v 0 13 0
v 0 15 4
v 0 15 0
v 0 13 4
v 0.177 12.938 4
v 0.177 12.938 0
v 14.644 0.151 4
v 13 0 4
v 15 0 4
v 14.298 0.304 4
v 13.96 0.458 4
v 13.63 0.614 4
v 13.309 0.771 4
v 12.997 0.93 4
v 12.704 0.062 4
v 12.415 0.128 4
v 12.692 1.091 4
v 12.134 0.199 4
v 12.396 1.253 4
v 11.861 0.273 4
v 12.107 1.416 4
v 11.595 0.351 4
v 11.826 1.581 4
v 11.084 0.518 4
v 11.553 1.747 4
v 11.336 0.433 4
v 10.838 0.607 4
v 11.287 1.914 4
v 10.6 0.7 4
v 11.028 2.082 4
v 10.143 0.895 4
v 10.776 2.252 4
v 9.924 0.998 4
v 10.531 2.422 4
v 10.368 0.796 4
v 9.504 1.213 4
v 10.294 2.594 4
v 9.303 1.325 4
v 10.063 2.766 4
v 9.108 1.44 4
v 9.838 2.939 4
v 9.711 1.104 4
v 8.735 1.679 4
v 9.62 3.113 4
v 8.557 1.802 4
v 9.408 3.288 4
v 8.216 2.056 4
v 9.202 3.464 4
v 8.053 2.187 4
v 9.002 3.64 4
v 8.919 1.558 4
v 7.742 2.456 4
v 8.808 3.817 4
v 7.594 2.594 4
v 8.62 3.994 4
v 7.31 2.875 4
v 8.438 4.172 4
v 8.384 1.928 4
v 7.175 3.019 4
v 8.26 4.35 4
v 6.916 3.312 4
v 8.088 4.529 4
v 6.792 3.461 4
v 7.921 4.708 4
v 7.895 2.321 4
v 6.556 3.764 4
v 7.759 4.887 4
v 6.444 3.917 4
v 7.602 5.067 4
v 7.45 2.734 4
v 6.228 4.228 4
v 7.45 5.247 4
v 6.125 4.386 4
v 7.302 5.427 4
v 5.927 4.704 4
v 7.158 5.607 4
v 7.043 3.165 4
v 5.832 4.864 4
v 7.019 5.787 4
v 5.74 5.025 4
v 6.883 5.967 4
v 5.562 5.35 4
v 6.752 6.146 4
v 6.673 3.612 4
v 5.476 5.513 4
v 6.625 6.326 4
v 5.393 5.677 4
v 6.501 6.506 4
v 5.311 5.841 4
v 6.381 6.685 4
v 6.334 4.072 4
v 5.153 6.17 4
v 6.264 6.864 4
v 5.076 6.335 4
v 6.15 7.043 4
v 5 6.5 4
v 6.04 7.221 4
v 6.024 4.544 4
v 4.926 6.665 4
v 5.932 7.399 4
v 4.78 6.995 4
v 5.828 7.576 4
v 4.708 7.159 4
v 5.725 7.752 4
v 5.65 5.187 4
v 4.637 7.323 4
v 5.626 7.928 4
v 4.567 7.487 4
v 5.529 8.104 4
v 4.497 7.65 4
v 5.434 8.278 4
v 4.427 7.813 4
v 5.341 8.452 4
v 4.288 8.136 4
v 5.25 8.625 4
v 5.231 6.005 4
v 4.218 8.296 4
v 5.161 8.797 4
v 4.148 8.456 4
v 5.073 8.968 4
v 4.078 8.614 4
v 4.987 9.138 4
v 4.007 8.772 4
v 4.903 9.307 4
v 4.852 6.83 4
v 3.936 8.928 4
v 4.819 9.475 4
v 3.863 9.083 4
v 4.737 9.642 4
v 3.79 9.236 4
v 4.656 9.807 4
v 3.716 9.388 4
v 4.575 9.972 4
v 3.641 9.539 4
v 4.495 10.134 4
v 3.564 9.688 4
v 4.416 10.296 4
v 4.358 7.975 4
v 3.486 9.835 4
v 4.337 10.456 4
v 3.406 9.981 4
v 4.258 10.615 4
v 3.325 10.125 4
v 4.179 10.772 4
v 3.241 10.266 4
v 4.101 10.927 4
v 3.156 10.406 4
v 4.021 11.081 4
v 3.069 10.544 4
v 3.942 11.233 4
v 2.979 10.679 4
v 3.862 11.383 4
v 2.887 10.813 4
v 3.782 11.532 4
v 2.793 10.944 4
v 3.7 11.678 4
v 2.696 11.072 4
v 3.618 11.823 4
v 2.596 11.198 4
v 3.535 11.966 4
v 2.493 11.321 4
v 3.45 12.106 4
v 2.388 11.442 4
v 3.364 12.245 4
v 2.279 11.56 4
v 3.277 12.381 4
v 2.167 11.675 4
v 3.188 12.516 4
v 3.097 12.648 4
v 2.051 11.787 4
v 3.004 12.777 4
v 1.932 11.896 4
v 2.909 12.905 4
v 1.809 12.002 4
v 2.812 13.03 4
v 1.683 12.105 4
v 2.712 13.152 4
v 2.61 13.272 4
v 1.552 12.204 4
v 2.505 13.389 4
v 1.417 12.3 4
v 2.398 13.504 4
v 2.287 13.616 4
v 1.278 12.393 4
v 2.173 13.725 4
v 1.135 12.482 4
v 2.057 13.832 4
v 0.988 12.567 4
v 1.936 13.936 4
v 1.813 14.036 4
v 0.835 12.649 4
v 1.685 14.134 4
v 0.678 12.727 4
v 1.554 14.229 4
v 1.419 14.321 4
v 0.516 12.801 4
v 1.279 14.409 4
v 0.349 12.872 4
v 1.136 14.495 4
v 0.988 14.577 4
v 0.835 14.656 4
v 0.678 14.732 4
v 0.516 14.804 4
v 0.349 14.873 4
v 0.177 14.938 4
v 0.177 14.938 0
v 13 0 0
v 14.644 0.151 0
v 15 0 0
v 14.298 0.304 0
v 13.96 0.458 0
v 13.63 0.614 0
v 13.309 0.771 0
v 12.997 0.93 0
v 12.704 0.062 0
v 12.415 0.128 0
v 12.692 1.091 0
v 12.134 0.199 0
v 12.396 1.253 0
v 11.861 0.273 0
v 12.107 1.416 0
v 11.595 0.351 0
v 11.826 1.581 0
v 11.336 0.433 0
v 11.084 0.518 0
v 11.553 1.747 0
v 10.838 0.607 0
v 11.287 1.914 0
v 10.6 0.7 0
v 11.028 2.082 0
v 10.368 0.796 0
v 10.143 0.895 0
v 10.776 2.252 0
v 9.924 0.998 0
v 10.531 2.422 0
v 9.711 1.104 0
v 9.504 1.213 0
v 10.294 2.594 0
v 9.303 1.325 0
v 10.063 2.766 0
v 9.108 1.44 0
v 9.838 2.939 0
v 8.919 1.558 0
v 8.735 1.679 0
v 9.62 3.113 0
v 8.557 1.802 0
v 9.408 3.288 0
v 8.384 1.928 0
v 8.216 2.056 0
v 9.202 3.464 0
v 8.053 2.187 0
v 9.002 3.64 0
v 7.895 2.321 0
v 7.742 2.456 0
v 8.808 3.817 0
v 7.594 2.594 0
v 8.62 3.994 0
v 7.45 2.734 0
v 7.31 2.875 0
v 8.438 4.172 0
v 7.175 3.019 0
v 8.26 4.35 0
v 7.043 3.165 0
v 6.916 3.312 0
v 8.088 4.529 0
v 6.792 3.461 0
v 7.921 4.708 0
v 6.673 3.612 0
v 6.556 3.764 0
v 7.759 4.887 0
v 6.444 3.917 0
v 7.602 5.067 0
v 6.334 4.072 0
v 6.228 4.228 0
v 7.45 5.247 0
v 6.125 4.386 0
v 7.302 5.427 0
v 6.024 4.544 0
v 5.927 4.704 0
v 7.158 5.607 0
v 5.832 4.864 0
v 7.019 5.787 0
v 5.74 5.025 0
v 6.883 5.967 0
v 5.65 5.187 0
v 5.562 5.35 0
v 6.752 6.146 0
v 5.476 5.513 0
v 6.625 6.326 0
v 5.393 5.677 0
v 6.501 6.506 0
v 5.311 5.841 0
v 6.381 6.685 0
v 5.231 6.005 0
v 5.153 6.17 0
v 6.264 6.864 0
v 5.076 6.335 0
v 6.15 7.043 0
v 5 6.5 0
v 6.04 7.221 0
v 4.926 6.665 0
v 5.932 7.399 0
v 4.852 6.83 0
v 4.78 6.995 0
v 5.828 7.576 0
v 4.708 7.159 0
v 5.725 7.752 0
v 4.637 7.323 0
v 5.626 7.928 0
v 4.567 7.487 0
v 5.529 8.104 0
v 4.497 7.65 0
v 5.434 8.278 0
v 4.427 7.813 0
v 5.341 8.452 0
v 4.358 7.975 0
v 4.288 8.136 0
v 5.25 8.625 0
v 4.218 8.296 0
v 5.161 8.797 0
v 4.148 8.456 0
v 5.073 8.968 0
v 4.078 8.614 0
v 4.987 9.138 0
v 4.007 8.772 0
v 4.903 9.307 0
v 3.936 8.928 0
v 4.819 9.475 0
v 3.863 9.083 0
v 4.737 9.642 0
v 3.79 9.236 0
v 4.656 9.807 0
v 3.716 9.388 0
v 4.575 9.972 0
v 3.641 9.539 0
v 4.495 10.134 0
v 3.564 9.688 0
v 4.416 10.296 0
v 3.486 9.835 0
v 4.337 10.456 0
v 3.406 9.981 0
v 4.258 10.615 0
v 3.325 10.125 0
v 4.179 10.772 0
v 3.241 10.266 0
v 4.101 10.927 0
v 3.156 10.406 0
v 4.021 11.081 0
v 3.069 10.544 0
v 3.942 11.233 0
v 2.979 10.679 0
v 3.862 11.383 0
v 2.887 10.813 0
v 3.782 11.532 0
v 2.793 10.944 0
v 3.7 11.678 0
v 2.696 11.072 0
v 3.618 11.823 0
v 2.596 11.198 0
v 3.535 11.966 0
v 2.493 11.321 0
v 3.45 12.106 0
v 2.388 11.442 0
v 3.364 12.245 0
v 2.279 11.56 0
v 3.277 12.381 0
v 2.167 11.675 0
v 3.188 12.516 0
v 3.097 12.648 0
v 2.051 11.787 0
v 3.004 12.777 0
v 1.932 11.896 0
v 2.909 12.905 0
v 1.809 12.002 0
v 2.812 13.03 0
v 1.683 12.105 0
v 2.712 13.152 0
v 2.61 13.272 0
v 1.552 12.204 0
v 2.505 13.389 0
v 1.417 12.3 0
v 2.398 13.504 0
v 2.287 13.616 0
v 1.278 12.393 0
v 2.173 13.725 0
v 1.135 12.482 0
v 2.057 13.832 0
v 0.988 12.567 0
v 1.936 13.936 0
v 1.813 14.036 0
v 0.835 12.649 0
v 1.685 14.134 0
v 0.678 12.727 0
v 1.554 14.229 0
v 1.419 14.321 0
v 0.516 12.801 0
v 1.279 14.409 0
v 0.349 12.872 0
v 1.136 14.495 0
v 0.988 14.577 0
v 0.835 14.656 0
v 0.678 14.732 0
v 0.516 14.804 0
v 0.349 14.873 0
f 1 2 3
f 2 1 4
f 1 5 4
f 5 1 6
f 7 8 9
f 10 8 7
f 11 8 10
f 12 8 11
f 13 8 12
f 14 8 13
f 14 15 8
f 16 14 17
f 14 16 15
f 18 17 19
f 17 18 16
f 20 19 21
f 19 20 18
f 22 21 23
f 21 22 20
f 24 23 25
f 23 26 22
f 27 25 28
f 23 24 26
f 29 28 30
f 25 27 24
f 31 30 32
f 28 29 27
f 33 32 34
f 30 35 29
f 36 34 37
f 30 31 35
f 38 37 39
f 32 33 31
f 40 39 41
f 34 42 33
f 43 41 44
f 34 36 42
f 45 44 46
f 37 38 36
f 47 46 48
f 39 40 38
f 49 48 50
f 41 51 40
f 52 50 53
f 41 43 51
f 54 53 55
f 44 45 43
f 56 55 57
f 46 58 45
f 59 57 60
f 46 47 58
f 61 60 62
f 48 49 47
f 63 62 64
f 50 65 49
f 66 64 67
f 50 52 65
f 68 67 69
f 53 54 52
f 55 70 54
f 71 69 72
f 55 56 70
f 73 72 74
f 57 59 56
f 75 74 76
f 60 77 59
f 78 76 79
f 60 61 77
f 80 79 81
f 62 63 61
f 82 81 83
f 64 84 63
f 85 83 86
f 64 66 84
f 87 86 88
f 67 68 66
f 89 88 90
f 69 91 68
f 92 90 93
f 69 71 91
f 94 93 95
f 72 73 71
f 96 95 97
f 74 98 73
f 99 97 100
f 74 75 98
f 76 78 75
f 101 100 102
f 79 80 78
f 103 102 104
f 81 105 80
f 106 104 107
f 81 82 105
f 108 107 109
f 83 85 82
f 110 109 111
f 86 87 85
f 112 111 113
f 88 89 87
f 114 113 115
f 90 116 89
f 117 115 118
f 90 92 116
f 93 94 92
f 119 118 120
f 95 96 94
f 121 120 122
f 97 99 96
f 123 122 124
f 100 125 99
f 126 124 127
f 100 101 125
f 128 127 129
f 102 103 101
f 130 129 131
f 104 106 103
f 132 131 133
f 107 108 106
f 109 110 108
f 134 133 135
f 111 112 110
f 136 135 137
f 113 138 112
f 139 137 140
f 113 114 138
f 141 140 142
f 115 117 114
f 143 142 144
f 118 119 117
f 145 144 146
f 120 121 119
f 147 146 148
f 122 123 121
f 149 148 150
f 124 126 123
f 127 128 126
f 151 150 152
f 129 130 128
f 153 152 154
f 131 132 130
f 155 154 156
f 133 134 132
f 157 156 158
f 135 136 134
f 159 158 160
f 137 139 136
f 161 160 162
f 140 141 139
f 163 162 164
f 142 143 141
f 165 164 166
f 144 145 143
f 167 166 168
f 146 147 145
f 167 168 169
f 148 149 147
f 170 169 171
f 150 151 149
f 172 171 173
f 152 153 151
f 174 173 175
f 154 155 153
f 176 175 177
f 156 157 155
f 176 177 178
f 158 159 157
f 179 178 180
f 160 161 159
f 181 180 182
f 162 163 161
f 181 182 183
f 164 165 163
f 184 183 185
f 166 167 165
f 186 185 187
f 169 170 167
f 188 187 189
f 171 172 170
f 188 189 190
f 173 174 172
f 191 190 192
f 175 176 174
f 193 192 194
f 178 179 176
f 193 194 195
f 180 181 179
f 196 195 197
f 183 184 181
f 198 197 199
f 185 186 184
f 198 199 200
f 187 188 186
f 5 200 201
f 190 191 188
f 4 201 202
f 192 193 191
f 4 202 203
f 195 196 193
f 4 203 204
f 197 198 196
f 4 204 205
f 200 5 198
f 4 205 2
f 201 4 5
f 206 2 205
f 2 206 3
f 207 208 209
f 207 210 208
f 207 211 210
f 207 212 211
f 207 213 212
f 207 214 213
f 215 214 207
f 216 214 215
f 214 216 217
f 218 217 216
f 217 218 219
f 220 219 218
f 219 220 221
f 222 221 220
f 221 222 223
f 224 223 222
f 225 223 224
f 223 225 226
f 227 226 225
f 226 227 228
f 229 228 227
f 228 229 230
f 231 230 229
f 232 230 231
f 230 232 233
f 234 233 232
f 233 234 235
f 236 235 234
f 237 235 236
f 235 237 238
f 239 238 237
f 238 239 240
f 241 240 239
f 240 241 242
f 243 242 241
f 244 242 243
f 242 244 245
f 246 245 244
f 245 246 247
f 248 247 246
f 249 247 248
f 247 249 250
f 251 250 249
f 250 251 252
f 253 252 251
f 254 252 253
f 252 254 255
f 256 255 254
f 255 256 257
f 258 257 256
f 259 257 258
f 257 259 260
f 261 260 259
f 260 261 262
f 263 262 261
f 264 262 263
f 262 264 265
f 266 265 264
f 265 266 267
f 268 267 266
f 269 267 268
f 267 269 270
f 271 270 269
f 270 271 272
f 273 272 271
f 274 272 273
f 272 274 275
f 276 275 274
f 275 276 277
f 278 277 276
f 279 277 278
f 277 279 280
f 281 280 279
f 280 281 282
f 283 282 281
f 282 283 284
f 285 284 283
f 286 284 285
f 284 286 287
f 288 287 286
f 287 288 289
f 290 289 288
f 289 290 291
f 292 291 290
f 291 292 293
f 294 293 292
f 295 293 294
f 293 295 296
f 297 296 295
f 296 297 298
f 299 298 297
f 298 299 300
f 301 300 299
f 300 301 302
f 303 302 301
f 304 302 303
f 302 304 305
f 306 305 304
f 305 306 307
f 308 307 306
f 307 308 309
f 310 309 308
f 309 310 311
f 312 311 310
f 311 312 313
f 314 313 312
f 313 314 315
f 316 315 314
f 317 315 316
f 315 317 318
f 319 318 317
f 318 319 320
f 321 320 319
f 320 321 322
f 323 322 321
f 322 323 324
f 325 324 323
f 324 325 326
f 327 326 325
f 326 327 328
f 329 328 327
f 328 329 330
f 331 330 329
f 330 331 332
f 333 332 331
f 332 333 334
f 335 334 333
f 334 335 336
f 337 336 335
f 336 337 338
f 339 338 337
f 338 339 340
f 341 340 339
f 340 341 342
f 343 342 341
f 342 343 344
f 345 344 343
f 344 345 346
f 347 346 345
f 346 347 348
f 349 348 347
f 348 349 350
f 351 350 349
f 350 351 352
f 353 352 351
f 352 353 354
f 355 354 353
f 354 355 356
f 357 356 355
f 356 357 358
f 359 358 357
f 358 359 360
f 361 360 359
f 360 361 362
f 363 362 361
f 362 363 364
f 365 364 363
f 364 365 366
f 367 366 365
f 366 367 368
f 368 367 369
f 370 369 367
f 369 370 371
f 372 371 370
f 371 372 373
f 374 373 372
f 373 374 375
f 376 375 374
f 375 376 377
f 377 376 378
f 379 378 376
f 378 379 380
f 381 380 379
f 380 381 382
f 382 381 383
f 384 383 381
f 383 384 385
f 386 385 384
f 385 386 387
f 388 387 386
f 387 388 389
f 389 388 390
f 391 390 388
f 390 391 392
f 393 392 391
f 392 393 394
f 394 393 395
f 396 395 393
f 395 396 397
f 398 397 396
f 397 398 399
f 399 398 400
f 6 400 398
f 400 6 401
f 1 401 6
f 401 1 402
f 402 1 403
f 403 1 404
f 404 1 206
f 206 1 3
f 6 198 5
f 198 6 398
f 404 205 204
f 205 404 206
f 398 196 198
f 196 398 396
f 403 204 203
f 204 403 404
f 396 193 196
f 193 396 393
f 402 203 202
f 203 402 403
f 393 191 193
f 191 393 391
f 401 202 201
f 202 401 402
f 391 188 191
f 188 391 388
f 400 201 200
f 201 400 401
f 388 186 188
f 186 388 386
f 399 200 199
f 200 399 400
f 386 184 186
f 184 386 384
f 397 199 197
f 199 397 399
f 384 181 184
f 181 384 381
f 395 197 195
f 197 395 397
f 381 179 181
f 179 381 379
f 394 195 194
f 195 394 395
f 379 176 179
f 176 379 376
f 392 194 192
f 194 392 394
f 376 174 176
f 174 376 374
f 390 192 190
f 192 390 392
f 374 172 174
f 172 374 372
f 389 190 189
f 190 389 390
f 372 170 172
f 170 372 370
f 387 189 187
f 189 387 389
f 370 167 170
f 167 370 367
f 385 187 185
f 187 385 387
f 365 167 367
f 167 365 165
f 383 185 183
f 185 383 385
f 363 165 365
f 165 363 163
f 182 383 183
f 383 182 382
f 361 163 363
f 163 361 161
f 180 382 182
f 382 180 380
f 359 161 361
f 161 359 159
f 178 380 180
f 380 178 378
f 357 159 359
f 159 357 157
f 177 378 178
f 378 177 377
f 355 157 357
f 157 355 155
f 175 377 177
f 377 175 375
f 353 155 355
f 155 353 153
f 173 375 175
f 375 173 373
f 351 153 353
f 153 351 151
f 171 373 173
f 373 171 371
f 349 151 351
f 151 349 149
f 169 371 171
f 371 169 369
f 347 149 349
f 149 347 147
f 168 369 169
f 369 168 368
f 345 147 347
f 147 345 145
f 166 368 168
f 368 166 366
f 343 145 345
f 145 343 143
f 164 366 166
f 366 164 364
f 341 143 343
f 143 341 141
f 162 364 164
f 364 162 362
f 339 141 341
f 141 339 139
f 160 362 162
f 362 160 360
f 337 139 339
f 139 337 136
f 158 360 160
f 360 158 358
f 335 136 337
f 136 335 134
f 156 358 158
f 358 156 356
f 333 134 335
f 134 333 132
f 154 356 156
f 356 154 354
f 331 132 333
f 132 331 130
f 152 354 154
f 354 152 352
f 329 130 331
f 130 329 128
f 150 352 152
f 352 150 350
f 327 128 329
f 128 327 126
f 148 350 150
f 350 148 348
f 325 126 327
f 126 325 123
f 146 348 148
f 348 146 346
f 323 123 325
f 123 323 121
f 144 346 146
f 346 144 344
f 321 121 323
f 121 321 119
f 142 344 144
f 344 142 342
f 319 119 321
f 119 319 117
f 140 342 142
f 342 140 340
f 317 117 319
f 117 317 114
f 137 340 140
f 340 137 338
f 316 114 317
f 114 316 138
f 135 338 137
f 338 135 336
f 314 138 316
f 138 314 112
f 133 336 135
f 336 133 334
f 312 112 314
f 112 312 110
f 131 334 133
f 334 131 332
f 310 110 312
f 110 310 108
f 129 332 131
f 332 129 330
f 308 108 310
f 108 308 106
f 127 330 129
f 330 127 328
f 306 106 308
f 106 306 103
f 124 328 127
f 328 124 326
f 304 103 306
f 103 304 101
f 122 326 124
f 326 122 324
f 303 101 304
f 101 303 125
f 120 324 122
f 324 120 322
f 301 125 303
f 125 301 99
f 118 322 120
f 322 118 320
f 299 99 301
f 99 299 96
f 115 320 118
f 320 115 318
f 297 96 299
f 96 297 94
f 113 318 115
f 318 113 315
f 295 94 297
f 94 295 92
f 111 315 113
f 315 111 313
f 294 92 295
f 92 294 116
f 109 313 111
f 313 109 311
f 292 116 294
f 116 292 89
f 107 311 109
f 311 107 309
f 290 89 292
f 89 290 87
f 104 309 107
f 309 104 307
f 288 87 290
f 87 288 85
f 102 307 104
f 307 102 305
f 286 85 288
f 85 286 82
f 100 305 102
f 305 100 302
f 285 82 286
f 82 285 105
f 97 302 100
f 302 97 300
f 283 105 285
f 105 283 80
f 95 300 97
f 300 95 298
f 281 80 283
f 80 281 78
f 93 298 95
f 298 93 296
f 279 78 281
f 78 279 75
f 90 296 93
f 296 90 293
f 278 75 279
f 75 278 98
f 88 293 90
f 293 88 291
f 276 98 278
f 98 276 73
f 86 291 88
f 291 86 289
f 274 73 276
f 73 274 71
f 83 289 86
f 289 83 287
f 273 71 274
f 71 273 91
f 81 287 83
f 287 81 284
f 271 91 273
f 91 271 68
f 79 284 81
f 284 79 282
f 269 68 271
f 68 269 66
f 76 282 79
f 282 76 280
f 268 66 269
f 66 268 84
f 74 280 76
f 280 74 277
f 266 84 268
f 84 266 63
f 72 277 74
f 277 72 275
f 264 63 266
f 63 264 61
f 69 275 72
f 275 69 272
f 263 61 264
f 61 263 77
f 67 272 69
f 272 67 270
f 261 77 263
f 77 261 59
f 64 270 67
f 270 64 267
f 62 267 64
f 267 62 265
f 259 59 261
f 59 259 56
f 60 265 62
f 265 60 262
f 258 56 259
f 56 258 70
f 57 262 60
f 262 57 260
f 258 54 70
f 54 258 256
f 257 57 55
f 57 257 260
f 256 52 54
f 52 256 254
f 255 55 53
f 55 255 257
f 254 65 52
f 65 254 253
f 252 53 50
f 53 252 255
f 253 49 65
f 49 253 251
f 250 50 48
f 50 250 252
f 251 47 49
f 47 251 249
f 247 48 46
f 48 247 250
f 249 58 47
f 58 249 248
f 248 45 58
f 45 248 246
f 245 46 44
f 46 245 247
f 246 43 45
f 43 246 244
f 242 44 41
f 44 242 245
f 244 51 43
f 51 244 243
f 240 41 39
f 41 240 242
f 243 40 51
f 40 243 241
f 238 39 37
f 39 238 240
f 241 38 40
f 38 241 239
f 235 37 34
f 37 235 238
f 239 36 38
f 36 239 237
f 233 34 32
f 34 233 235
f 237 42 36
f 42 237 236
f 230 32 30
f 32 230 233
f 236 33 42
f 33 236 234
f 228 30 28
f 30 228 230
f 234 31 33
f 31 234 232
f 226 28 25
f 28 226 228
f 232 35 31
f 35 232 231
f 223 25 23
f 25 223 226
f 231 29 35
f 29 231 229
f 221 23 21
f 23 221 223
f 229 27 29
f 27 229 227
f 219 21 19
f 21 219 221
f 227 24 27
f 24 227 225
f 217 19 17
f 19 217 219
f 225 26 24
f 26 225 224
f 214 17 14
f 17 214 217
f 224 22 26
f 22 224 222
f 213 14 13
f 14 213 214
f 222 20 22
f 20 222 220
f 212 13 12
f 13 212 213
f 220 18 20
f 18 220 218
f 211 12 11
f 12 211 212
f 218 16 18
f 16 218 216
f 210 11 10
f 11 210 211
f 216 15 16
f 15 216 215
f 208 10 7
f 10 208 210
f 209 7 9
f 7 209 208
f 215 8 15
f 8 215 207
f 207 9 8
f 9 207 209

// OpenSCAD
//=====================================
// This is public Domain Code
// Contributed by: William A Adams
//=====================================
joinfactor = 0.125;

gSteps = 100;
gHeight = 4;

//======================================
// Demos
//======================================
//BezCubicFilletColored( [[0, 15],[5,5],[10,5],[15,15]], [7.5,12], gSteps, gHeight, 
//	[[1,0,0],[1,1,0],[0,1,1],[0,0,1]]);
//BezCubicFilletColored( [[0, 15],[5,5],[10,5],[15,15]], [7.5,18], gSteps, gHeight, 
//	[[1,0,0],[0,1,0],[0,1,0],[0,0,1]]);
//DrawCubicControlPoints([[0, 15],[5,5],[10,5],[15,15]], [7.5,18], gHeight, $fn=12);

//BezCubicFillet( [[0, 5],[5,15],[10,3],[15,10]], [7.5,0], gSteps, gHeight);
//DrawCubicControlPoints( [[0, 5],[5,15],[10,3],[15,10]], [7.5,0], gHeight, $fn=12);

BezCubicRibbon([[0,15],[6,13],[3,5],[15,0]], [[0,13],[6,11],[3,2],[13,0]]);

//=======================================
// Functions
// These are the 4 blending functions for a cubic bezier curve
//=======================================
// Bernstein Polynomials
function BEZ03(u) = pow((1-u), 3);
function BEZ13(u) = 3*u*(pow((1-u),2));
function BEZ23(u) = 3*(pow(u,2))*(1-u);
function BEZ33(u) = pow(u,3);

// Calculate a singe point along a cubic bezier curve
function PointOnBezCubic2D(p0, p1, p2, p3, u) = [
	BEZ03(u)*p0[0]+BEZ13(u)*p1[0]+BEZ23(u)*p2[0]+BEZ33(u)*p3[0],
	BEZ03(u)*p0[1]+BEZ13(u)*p1[1]+BEZ23(u)*p2[1]+BEZ33(u)*p3[1]];

function PointOnBezCubic3D(p0, p1, p2, p3, u) = [
	BEZ03(u)*p0[0]+BEZ13(u)*p1[0]+BEZ23(u)*p2[0]+BEZ33(u)*p3[0],
	BEZ03(u)*p0[1]+BEZ13(u)*p1[1]+BEZ23(u)*p2[1]+BEZ33(u)*p3[1],
	BEZ03(u)*p0[2]+BEZ13(u)*p1[2]+BEZ23(u)*p2[2]+BEZ33(u)*p3[2]];

//=======================================
// Modules
//=======================================
// This function will extrude a bezier solid from a bezier curve
// It is a straight up prism
// c - ControlPoints
//
module BezCubicFillet(c, focalPoint, steps=gSteps, height=gHeight)
{
	for(step = [steps:1])
	{
		linear_extrude(height = height, convexity = 10) 
		polygon(
			points=[
				focalPoint,
				PointOnBezCubic2D(c[0], c[1], c[2],c[3], step/steps),
				PointOnBezCubic2D(c[0], c[1], c[2],c[3], (step-1)/steps)],
			paths=[[0,1,2,0]]
		);
	}
}

module BezCubicFilletColored(c, focalPoint, steps=gSteps, height=gHeight, colors)
{
	for(step = [steps:1])
	{
		color(PointOnBezCubic3D(colors[0], colors[1], colors[2], colors[3], step/steps))
		linear_extrude(height = height, convexity = 10) 
		polygon(
			points=[
				focalPoint,
				PointOnBezCubic2D(c[0], c[1], c[2],c[3], step/steps),
				PointOnBezCubic2D(c[0], c[1], c[2],c[3], (step-1)/steps)],
			paths=[[0,1,2,0]]
		);
	}
}


module BezCubicRibbon(c1, c2, steps=gSteps, height=gHeight, colors=[[1,0,0],[1,1,0],[0,1,1],[0,0,1]])
{
	for (step=[0:steps-1])
	{
		color(PointOnBezCubic3D(colors[0], colors[1], colors[2], colors[3], step/steps))
		linear_extrude(height = height, convexity = 10) 
		polygon(
			points=[
				PointOnBezCubic2D(c1[0], c1[1], c1[2],c1[3], step/steps),
				PointOnBezCubic2D(c2[0], c2[1], c2[2],c2[3], (step)/steps),
				PointOnBezCubic2D(c2[0], c2[1], c2[2],c2[3], (step+1)/steps),
				PointOnBezCubic2D(c1[0], c1[1], c1[2],c1[3], (step+1)/steps)],
			paths=[[0,1,2,3]]
		);

	}
}

//==============================================
// Test functions
//
// These test functions help demonstrate that the core blending
// functions actually work correctly.
//==============================================
//PlotBEZ0(100);
//PlotBEZ1(100);
//PlotBEZ2(100);
//PlotBEZ3(100);
//PlotBez4Blending();

module DrawCubicControlPoints(c, focalPoint, height)
{
	// Draw control points
	// Start point
	translate(c[0])
	color([1,0,0])
	cylinder(r=0.5, h=height+joinfactor);

	// Controll point 1
	translate(c[1])
	color([0,0,0])
	cylinder(r=0.5, h=height+joinfactor);

	// Control point 2
	translate(c[2])
	color([0,0,0])
	cylinder(r=0.5, h=height+joinfactor);

	// End Point
	translate(c[3])
	color([0,0,1])
	cylinder(r=0.5, h=height+joinfactor);


	// Draw the focal point
	translate(focalPoint)
	color([0,1,0])
	cylinder(r=0.5, h=height+joinfactor);
}

module PlotBEZ0(steps)
{
	cubeSize = 1;
	cubeHeight = steps;

	for (step=[0:steps])
	{
		translate([cubeSize*step, 0, 0])
		cube(size=[cubeSize, cubeSize, BEZ03(step/steps)*cubeHeight]);
	}	
}

module PlotBEZ1(steps)
{
	cubeSize = 1;
	cubeHeight = steps;

	for (step=[0:steps])
	{
		translate([cubeSize*step, 0, 0])
		cube(size=[cubeSize, cubeSize, BEZ13(step/steps)*cubeHeight]);
	}	
}

module PlotBEZ2(steps)
{
	cubeSize = 1;
	cubeHeight = steps;

	for (step=[0:steps])
	{
		translate([cubeSize*step, 0, 0])
		cube(size=[cubeSize, cubeSize, BEZ23(step/steps)*cubeHeight]);
	}	
}

module PlotBEZ3(steps)
{
	cubeSize = 1;
	cubeHeight = steps;

	for (step=[0:steps])
	{
		translate([cubeSize*step, 0, 0])
		cube(size=[cubeSize, cubeSize, BEZ33(step/steps)*cubeHeight]);
	}	
}

module PlotBez4Blending()
{
	sizing = 100;

	translate([0, 0, sizing + 10])
	PlotBEZ0(100);

	translate([sizing+10, 0, sizing + 10])
	PlotBEZ1(100);

	translate([0, 0, 0])
	PlotBEZ2(100);

	translate([sizing+10, 0, 0])
	PlotBEZ3(100);
}
